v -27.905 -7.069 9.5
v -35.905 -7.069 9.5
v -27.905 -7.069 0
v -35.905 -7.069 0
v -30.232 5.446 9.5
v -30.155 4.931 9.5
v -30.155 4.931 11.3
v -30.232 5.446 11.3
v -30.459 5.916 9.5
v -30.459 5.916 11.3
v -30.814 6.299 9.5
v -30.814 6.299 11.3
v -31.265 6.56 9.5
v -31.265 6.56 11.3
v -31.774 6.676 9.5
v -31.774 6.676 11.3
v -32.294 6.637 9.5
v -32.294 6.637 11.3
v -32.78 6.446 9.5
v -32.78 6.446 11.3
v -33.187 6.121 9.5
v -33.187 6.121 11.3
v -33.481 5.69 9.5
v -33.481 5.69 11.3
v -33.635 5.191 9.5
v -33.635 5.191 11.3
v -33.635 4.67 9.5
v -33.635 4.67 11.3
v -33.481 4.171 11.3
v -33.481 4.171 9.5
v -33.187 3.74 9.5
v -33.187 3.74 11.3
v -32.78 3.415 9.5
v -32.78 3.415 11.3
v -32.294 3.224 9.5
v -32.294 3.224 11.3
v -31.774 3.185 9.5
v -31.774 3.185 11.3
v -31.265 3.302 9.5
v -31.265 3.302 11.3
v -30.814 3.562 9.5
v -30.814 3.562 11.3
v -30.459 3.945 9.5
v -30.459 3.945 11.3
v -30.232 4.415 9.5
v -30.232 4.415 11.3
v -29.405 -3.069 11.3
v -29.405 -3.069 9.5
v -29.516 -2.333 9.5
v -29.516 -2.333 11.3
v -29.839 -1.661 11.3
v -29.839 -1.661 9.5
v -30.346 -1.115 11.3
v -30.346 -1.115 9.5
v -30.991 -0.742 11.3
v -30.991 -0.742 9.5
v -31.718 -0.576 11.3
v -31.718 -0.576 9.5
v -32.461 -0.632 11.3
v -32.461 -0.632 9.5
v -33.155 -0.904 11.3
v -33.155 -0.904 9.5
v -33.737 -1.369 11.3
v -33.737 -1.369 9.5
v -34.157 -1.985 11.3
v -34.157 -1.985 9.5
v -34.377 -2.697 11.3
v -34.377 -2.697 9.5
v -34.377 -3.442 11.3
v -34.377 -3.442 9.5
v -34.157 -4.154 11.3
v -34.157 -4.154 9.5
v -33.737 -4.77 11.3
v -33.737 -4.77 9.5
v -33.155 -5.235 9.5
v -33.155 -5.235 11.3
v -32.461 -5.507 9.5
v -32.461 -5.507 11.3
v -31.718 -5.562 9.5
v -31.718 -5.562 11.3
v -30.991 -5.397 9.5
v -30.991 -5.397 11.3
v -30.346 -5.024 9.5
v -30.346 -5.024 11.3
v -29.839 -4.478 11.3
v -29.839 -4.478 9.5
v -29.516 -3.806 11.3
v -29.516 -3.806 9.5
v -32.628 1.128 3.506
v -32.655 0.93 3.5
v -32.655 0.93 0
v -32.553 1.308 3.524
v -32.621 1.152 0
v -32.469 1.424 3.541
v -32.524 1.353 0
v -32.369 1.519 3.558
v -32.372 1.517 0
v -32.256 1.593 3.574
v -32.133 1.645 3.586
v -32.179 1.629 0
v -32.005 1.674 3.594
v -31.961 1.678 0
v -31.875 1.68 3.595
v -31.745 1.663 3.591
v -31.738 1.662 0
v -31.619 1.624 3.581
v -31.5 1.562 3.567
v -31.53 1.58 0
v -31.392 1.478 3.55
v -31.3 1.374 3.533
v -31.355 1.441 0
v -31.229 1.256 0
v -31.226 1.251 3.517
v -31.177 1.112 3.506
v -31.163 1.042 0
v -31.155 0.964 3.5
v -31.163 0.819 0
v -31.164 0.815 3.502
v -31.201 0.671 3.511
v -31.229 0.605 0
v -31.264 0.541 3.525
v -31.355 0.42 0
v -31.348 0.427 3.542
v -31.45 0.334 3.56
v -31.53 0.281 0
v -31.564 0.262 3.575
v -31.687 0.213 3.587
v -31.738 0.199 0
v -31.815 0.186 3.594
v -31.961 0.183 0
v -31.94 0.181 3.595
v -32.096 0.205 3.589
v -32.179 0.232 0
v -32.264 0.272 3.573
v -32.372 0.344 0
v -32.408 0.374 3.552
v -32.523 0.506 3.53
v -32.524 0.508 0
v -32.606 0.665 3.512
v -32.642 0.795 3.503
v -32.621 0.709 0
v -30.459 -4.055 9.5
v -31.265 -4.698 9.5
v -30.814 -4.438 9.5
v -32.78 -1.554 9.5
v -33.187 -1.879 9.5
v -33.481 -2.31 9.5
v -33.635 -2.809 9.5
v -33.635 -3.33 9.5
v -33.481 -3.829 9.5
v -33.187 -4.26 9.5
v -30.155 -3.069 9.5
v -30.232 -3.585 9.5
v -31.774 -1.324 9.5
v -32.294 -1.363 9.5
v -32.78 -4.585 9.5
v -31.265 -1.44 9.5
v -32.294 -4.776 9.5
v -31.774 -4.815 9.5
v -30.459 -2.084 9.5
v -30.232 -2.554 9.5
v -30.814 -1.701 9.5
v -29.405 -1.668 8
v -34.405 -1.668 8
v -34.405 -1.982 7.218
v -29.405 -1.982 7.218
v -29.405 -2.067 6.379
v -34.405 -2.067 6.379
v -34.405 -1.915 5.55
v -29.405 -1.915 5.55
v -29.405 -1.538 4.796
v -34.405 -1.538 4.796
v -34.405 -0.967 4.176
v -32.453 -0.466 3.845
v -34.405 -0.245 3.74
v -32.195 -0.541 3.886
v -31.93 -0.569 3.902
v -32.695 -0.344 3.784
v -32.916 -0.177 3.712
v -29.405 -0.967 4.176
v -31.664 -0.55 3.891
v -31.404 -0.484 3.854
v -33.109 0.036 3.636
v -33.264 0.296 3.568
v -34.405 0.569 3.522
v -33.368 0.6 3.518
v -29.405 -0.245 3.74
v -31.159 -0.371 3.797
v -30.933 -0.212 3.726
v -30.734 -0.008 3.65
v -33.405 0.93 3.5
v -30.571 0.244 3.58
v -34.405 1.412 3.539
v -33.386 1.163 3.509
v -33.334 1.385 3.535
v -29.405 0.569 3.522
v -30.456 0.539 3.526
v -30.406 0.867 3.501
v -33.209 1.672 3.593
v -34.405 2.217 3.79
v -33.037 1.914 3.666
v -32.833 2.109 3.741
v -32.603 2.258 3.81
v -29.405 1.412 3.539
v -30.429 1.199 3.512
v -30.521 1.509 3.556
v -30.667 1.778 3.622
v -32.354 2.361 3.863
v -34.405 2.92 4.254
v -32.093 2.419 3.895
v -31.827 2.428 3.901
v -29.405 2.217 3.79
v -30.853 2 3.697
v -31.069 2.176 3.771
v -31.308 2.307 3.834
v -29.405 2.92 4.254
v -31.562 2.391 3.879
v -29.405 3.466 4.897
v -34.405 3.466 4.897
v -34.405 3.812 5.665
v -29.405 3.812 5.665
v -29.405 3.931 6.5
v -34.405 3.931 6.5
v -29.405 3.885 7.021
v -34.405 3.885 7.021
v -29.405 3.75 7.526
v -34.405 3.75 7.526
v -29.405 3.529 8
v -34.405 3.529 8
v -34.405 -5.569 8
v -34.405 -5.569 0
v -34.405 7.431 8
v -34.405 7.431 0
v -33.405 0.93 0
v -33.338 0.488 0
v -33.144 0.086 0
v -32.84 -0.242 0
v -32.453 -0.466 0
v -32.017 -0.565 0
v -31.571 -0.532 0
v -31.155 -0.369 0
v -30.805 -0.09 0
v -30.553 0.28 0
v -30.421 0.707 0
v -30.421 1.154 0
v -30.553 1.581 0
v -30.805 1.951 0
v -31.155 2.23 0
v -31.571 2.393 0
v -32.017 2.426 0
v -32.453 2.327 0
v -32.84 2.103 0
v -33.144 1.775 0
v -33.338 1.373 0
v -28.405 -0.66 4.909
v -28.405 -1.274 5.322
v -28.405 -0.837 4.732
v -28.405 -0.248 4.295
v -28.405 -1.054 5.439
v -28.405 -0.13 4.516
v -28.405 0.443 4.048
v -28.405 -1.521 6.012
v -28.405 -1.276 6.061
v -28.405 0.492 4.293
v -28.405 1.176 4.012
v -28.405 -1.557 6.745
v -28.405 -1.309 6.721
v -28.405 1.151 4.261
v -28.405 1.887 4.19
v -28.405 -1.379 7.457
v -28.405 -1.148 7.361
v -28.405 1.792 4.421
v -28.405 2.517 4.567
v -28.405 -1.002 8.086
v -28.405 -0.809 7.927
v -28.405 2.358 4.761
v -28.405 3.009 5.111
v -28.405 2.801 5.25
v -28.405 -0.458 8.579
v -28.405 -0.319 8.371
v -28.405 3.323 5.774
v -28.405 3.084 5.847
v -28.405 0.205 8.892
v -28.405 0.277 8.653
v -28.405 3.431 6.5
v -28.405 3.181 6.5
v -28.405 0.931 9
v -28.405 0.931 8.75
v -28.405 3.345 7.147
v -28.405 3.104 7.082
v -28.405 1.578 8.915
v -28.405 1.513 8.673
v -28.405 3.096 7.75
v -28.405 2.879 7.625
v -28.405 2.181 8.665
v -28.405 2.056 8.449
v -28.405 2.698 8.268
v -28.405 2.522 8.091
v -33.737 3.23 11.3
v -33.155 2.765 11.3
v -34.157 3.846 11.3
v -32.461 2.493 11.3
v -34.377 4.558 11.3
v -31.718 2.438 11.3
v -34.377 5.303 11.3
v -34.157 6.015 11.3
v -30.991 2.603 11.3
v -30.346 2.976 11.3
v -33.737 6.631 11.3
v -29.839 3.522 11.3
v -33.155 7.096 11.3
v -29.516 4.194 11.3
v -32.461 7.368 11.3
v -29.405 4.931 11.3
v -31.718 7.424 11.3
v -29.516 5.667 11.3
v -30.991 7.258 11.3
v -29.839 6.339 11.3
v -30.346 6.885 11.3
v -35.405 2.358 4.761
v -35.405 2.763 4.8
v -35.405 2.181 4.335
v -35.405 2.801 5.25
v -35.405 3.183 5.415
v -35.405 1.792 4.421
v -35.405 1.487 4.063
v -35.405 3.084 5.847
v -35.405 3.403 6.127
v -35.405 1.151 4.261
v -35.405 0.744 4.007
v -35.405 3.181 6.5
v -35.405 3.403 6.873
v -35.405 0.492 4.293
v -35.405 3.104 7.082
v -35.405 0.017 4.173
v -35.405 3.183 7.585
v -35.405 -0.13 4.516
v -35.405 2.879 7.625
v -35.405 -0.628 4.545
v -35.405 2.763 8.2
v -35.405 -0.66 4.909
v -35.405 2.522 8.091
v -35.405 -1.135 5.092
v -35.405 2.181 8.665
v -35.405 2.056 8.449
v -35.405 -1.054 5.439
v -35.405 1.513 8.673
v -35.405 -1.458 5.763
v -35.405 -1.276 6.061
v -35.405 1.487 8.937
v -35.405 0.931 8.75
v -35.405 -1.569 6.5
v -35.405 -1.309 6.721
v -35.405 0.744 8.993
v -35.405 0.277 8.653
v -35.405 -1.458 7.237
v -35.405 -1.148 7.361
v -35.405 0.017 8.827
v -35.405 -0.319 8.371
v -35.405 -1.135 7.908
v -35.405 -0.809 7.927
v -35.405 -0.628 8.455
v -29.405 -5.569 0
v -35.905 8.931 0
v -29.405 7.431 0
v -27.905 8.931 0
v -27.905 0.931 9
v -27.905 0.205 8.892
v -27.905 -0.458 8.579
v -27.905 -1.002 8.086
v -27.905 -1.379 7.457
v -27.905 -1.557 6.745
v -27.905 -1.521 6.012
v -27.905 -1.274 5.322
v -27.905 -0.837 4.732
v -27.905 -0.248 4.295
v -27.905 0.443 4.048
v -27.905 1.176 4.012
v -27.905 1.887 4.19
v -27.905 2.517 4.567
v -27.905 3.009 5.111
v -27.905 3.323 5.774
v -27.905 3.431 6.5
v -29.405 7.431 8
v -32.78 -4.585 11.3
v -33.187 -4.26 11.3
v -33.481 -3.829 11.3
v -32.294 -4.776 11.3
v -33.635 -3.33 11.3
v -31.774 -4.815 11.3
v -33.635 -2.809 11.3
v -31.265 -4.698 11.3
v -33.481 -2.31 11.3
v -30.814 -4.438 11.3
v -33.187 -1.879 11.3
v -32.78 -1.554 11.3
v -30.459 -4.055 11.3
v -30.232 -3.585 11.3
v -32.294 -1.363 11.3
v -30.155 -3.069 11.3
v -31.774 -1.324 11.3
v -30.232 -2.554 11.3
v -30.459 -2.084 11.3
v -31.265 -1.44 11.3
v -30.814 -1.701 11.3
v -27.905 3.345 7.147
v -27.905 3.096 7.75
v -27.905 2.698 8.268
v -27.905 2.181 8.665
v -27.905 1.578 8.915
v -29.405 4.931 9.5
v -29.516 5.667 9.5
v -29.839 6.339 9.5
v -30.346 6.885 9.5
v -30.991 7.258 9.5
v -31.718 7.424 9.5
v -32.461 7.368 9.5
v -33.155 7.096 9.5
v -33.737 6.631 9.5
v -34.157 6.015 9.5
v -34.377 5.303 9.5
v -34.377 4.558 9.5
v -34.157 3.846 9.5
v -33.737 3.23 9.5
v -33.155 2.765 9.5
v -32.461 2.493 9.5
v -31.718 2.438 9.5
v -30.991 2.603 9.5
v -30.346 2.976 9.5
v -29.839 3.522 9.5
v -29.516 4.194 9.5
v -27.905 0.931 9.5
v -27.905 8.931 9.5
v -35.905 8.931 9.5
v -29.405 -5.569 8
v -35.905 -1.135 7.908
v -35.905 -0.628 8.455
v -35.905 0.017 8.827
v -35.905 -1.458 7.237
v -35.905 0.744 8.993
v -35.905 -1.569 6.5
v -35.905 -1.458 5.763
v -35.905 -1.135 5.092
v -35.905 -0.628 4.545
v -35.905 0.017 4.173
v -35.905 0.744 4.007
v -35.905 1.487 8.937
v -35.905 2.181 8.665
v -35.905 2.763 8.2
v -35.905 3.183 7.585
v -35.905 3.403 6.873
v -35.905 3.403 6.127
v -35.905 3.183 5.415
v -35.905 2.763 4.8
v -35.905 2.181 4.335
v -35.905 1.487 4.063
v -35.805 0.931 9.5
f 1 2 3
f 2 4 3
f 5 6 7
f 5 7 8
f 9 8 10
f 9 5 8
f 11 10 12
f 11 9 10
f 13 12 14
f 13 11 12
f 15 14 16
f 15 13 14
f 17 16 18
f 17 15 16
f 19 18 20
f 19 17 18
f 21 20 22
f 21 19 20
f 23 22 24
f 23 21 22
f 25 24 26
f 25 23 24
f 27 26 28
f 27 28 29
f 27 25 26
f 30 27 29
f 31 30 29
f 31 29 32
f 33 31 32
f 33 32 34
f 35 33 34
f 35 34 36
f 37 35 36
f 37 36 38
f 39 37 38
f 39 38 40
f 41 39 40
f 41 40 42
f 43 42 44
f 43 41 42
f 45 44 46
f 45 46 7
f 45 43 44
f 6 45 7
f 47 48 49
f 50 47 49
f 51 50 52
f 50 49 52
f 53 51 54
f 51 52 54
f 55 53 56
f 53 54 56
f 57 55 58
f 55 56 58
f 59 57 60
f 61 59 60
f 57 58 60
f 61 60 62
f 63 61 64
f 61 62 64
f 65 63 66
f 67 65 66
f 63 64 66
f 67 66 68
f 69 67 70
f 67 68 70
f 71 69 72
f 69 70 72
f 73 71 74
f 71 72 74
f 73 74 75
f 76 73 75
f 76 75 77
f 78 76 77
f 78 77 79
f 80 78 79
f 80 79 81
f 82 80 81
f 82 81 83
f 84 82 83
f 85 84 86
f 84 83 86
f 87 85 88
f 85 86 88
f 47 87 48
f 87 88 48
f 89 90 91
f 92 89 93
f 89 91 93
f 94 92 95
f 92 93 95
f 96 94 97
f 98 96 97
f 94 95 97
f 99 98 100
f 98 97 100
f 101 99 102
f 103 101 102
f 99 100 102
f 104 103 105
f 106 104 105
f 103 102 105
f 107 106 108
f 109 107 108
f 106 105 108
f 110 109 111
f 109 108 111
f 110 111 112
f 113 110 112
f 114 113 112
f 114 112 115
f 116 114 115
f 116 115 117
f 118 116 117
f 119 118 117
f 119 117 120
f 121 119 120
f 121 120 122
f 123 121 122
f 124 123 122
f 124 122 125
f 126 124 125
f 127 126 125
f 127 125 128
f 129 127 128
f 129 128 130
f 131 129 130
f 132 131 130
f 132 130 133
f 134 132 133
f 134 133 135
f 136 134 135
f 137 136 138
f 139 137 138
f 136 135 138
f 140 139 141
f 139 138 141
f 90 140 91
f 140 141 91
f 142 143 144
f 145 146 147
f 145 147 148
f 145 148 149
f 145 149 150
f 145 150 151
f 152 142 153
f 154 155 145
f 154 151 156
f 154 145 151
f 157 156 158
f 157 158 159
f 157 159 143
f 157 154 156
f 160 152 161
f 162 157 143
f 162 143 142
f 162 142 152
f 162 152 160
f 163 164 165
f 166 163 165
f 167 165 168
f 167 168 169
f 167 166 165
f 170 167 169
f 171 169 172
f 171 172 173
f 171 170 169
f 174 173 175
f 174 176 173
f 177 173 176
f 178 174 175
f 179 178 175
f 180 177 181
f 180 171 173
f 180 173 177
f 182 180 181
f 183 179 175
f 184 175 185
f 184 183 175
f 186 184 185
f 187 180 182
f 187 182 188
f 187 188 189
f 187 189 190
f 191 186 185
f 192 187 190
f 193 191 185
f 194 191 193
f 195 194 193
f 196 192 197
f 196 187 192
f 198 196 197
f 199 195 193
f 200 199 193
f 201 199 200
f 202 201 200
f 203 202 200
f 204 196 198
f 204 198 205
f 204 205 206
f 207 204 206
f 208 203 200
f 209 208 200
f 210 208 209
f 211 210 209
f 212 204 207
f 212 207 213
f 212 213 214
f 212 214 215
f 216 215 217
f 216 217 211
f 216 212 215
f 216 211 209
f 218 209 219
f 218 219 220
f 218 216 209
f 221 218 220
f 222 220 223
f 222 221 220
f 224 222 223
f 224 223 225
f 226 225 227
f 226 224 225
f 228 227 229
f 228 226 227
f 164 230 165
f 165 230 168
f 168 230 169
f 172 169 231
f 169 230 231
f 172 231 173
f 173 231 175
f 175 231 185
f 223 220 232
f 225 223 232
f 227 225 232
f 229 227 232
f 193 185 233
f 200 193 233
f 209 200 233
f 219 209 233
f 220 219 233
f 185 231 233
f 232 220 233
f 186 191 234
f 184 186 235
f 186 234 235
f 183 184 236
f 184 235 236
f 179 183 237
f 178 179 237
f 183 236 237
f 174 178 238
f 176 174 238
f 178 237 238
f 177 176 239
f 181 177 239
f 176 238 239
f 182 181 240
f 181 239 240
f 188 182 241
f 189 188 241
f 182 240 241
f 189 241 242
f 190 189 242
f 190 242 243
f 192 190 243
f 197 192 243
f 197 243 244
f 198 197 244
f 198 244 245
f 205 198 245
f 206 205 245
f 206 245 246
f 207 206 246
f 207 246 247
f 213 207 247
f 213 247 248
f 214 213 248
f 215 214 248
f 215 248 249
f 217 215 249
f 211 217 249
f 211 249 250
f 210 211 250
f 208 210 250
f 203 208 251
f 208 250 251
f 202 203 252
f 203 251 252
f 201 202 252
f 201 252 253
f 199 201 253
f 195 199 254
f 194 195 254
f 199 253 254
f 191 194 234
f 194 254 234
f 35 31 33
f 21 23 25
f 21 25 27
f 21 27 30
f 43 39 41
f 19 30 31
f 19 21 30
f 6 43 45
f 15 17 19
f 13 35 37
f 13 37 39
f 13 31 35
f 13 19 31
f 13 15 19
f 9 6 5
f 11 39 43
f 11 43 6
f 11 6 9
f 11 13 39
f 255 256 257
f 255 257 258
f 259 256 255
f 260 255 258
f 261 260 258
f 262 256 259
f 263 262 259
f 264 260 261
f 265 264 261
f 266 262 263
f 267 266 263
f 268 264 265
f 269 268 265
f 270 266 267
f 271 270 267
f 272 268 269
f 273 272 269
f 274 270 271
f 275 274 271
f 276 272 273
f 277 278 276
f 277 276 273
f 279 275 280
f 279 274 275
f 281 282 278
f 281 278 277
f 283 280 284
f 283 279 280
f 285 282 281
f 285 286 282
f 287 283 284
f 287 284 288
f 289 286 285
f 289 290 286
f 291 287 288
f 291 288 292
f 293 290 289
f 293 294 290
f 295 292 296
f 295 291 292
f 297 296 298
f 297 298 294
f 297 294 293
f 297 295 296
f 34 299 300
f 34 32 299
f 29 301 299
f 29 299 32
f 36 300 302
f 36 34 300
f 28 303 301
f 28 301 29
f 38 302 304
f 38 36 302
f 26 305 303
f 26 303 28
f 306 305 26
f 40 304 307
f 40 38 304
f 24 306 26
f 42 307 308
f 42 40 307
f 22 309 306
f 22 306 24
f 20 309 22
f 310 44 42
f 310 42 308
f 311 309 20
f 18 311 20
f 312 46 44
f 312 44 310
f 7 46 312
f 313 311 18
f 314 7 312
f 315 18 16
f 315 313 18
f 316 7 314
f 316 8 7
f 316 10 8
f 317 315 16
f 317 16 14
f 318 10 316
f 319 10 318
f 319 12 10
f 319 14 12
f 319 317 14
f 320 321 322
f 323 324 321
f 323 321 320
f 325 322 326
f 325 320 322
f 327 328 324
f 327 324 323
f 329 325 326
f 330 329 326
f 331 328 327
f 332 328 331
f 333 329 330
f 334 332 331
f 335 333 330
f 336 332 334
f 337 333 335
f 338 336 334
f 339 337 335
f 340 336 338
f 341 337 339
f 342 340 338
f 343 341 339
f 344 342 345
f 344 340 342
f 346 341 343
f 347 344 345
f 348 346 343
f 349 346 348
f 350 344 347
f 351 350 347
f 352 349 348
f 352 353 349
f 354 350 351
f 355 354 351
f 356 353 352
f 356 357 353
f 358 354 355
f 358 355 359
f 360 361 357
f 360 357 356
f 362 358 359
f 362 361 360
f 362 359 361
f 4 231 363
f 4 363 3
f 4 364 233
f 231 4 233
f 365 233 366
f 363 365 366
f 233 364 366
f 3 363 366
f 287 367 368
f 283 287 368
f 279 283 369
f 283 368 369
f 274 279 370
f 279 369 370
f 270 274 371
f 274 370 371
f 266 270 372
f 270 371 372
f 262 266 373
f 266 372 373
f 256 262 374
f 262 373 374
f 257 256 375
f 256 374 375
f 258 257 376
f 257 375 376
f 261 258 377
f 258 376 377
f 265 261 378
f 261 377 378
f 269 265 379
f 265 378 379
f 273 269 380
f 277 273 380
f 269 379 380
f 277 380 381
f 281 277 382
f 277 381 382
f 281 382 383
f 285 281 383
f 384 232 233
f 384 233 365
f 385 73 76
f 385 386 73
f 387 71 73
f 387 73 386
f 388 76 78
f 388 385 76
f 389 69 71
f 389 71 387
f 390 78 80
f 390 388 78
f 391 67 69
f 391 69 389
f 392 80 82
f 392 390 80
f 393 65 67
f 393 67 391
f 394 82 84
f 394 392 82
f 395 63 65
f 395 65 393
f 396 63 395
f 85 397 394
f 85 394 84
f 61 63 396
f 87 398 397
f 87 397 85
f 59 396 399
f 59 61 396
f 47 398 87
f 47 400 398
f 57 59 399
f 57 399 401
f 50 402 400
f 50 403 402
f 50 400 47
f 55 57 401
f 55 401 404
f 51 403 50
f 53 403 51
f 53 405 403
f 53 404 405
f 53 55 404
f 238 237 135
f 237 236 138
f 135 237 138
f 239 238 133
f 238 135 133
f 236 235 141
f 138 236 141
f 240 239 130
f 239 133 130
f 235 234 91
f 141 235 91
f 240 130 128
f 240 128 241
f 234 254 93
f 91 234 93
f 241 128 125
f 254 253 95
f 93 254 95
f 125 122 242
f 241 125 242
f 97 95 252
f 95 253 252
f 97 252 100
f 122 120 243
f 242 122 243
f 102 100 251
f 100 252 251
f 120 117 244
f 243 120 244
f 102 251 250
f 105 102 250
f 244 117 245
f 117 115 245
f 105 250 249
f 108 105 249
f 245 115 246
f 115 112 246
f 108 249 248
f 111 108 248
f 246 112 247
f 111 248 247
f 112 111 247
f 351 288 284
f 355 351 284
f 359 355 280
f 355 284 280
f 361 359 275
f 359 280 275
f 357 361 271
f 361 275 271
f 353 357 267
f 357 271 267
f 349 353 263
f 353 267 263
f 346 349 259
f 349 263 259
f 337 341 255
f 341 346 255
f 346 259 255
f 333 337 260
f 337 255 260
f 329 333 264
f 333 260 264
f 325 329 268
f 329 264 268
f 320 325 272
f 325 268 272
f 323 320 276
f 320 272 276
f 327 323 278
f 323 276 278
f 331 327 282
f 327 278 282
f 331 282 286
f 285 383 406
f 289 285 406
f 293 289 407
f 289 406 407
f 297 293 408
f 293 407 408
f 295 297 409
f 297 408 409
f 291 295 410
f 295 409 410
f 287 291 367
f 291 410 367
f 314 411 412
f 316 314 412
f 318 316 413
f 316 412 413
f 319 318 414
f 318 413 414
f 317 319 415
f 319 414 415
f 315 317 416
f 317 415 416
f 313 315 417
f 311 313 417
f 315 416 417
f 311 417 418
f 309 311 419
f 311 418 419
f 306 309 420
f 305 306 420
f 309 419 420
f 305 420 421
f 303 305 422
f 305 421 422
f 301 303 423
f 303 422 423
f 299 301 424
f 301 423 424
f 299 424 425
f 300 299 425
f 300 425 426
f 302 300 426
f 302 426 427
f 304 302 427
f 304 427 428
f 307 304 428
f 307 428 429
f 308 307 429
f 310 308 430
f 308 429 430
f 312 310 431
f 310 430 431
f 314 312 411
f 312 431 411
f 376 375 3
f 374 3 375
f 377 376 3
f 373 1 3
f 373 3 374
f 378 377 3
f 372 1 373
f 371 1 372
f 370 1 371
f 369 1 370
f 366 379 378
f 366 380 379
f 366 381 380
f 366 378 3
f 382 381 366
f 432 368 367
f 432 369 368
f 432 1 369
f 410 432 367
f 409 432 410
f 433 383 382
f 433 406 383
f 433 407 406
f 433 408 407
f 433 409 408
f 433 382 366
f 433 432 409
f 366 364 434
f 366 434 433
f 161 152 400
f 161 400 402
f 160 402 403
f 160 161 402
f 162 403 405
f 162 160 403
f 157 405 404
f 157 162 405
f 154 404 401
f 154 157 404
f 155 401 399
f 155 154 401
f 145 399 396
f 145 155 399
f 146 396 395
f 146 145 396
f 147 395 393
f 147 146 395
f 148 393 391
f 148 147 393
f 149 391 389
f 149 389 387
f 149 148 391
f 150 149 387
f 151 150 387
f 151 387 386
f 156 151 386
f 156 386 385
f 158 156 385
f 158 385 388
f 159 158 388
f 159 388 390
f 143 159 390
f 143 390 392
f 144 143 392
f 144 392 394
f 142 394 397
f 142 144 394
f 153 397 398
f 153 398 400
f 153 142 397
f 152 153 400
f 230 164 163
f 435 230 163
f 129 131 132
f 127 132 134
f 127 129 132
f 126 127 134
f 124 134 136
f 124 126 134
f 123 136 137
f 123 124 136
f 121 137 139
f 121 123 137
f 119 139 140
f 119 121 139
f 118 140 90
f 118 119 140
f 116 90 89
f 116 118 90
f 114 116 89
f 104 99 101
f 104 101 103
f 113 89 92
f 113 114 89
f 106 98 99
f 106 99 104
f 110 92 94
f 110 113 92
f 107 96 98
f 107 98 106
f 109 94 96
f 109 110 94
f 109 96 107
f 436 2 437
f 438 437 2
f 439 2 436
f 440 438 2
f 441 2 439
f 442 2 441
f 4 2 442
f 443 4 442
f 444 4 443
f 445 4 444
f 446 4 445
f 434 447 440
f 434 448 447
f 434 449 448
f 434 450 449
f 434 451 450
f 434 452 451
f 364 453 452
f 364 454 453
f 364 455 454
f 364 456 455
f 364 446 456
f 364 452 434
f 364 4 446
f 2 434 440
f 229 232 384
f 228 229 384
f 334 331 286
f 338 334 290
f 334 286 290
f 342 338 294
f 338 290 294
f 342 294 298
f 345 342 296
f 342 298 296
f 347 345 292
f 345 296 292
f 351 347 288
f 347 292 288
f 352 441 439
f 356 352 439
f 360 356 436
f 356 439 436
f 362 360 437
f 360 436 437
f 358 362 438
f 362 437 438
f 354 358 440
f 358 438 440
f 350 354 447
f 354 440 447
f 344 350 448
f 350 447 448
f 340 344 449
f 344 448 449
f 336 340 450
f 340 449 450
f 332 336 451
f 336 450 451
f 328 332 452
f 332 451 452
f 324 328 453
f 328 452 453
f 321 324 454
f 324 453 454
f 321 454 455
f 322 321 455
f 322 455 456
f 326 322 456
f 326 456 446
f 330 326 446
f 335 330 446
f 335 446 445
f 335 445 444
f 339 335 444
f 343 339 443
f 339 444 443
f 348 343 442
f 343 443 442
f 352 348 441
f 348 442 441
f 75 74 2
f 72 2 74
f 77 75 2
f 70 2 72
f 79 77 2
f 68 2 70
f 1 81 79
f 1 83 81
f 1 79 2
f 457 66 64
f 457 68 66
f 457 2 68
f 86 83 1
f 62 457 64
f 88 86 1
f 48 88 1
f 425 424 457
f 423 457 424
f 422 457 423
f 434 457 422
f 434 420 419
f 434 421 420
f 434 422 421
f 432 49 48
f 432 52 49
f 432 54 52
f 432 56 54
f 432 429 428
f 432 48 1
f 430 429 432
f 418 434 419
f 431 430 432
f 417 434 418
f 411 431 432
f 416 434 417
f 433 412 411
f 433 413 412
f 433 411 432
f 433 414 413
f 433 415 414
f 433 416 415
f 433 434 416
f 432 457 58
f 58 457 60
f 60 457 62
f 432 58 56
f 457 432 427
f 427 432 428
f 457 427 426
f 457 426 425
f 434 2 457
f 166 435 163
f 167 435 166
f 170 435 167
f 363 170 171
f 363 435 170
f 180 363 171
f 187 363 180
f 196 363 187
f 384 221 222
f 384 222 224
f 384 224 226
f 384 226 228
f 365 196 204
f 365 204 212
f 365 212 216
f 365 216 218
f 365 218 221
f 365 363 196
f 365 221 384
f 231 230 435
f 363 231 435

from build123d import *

# Parameters (mm, degrees)
F1_W      = 8
F1_H      = 16
F1_W_2    = 5
F1_H_2    = 13
F2_DEPTH  = 8
F3_W      = 8
F3_H      = 16
F3_W_2    = 5
F3_H_2    = 13
F4_DEPTH  = 1.5
F5_R      = 2.5
F5_R_2    = 1.75
F6_DEPTH  = 1.8
F8_DEPTH  = 7.9
F10_DEPTH = 25
F11_DEPTH = 0.5
F12_R     = 2.5
F12_R_2   = 2.25
F13_DEPTH = 0.5
F15_DEPTH = 4.2


with BuildPart() as f2:
    # F1 (on face) → F2 (new body)
    with BuildSketch(Plane.XY):
        with Locations((-31.9046421945, 0.9305412807)):
            Rectangle(F1_W, F1_H)
        with Locations((-31.9046421945, 0.9305412807)):
            Rectangle(F1_W_2, F1_H_2, mode=Mode.SUBTRACT)
    extrude(amount=F2_DEPTH)

    # F3 (on face) → F4 (join)
    with BuildSketch(Plane.XY.offset(8)):
        with Locations((-31.9046421945, 0.9305412807)):
            Rectangle(F3_W, F3_H)
        with Locations((-31.9046421945, 0.9305412807)):
            Rectangle(F3_W_2, F3_H_2, mode=Mode.SUBTRACT)
        with Locations((-31.9046421945, 0.9305412807)):
            Rectangle(F3_W_2, F3_H_2)
    extrude(amount=F4_DEPTH)

    # F5 (on face) → F6 (join)
    with BuildSketch(Plane.XY.offset(9.5)):
        with Locations((-31.9046421945, -3.0694587193)):
            Circle(F5_R)
        with Locations((-31.9046421945, -3.0694587193)):
            Circle(F5_R_2, mode=Mode.SUBTRACT)
        with Locations((-31.9046421945, 4.9305412807)):
            Circle(F5_R)
        with Locations((-31.9046421945, 4.9305412807)):
            Circle(F5_R_2, mode=Mode.SUBTRACT)
    extrude(amount=F6_DEPTH)

    # F7 (on face) → F8 (join)
    with BuildSketch(Plane.YZ.offset(-27.9046421945)):
        with BuildLine():
            ThreePointArc((0.9305412807, 9.5), (-1.1907790629, 4.3786796564), (3.9305412807, 6.5))
            ThreePointArc((3.9305412807, 6.5), (3.0518616242, 8.6213203436), (0.9305412807, 9.5))
        make_face()
    extrude(amount=-F8_DEPTH)

    # F9 (on face) → F10 (cut)
    with BuildSketch(Plane.YZ.offset(-27.9046421945)):
        with BuildLine():
            ThreePointArc((3.1805412807, 6.5), (2.5215315383, 8.0909902577), (0.9305412807, 8.75))
            ThreePointArc((0.9305412807, 8.75), (-0.660448977, 4.9090097423), (3.1805412807, 6.5))
        make_face()
    extrude(amount=-F10_DEPTH, mode=Mode.SUBTRACT)

    # F9 (on face) → F11 (cut)
    with BuildSketch(Plane.YZ.offset(-27.9046421945)):
        with BuildLine():
            ThreePointArc((0.9305412807, 9), (-0.8372256723, 4.732233047), (3.4305412807, 6.5))
            ThreePointArc((3.4305412807, 6.5), (2.6983082336, 8.267766953), (0.9305412807, 9))
        make_face()
        with BuildLine():
            ThreePointArc((3.1805412807, 6.5), (-0.660448977, 4.9090097423), (0.9305412807, 8.75))
            ThreePointArc((0.9305412807, 8.75), (2.5215315383, 8.0909902577), (3.1805412807, 6.5))
        make_face(mode=Mode.SUBTRACT)
    extrude(amount=-F11_DEPTH, mode=Mode.SUBTRACT)

    # F12 (on face) → F13 (cut)
    with BuildSketch(Plane(origin=(-35.9046421945, 0, 0), x_dir=(0, -1, 0), z_dir=(-1, 0, 0))):
        with Locations((-0.9305412807, 6.5)):
            Circle(F12_R)
        with Locations((-0.9305412807, 6.5)):
            Circle(F12_R_2, mode=Mode.SUBTRACT)
    extrude(amount=-F13_DEPTH, mode=Mode.SUBTRACT)

    # F14 (on Top) → F15 (join)
    with BuildSketch(Plane.XY):
        with BuildLine():
            ThreePointArc((-30.4045602381, 0.9304907289), (-31.9045602381, 2.4304907289), (-33.4045602381, 0.9304907289))
            ThreePointArc((-33.4045602381, 0.9304907289), (-31.9045602381, -0.5695092711), (-30.4045602381, 0.9304907289))
        make_face()
        with BuildLine():
            ThreePointArc((-31.1545602381, 0.9304907289), (-31.9045602381, 0.1804907289), (-32.6545602381, 0.9304907289))
            ThreePointArc((-32.6545602381, 0.9304907289), (-31.9045602381, 1.6804907289), (-31.1545602381, 0.9304907289))
        make_face(mode=Mode.SUBTRACT)
    extrude(amount=F15_DEPTH)


solid = f2.part
